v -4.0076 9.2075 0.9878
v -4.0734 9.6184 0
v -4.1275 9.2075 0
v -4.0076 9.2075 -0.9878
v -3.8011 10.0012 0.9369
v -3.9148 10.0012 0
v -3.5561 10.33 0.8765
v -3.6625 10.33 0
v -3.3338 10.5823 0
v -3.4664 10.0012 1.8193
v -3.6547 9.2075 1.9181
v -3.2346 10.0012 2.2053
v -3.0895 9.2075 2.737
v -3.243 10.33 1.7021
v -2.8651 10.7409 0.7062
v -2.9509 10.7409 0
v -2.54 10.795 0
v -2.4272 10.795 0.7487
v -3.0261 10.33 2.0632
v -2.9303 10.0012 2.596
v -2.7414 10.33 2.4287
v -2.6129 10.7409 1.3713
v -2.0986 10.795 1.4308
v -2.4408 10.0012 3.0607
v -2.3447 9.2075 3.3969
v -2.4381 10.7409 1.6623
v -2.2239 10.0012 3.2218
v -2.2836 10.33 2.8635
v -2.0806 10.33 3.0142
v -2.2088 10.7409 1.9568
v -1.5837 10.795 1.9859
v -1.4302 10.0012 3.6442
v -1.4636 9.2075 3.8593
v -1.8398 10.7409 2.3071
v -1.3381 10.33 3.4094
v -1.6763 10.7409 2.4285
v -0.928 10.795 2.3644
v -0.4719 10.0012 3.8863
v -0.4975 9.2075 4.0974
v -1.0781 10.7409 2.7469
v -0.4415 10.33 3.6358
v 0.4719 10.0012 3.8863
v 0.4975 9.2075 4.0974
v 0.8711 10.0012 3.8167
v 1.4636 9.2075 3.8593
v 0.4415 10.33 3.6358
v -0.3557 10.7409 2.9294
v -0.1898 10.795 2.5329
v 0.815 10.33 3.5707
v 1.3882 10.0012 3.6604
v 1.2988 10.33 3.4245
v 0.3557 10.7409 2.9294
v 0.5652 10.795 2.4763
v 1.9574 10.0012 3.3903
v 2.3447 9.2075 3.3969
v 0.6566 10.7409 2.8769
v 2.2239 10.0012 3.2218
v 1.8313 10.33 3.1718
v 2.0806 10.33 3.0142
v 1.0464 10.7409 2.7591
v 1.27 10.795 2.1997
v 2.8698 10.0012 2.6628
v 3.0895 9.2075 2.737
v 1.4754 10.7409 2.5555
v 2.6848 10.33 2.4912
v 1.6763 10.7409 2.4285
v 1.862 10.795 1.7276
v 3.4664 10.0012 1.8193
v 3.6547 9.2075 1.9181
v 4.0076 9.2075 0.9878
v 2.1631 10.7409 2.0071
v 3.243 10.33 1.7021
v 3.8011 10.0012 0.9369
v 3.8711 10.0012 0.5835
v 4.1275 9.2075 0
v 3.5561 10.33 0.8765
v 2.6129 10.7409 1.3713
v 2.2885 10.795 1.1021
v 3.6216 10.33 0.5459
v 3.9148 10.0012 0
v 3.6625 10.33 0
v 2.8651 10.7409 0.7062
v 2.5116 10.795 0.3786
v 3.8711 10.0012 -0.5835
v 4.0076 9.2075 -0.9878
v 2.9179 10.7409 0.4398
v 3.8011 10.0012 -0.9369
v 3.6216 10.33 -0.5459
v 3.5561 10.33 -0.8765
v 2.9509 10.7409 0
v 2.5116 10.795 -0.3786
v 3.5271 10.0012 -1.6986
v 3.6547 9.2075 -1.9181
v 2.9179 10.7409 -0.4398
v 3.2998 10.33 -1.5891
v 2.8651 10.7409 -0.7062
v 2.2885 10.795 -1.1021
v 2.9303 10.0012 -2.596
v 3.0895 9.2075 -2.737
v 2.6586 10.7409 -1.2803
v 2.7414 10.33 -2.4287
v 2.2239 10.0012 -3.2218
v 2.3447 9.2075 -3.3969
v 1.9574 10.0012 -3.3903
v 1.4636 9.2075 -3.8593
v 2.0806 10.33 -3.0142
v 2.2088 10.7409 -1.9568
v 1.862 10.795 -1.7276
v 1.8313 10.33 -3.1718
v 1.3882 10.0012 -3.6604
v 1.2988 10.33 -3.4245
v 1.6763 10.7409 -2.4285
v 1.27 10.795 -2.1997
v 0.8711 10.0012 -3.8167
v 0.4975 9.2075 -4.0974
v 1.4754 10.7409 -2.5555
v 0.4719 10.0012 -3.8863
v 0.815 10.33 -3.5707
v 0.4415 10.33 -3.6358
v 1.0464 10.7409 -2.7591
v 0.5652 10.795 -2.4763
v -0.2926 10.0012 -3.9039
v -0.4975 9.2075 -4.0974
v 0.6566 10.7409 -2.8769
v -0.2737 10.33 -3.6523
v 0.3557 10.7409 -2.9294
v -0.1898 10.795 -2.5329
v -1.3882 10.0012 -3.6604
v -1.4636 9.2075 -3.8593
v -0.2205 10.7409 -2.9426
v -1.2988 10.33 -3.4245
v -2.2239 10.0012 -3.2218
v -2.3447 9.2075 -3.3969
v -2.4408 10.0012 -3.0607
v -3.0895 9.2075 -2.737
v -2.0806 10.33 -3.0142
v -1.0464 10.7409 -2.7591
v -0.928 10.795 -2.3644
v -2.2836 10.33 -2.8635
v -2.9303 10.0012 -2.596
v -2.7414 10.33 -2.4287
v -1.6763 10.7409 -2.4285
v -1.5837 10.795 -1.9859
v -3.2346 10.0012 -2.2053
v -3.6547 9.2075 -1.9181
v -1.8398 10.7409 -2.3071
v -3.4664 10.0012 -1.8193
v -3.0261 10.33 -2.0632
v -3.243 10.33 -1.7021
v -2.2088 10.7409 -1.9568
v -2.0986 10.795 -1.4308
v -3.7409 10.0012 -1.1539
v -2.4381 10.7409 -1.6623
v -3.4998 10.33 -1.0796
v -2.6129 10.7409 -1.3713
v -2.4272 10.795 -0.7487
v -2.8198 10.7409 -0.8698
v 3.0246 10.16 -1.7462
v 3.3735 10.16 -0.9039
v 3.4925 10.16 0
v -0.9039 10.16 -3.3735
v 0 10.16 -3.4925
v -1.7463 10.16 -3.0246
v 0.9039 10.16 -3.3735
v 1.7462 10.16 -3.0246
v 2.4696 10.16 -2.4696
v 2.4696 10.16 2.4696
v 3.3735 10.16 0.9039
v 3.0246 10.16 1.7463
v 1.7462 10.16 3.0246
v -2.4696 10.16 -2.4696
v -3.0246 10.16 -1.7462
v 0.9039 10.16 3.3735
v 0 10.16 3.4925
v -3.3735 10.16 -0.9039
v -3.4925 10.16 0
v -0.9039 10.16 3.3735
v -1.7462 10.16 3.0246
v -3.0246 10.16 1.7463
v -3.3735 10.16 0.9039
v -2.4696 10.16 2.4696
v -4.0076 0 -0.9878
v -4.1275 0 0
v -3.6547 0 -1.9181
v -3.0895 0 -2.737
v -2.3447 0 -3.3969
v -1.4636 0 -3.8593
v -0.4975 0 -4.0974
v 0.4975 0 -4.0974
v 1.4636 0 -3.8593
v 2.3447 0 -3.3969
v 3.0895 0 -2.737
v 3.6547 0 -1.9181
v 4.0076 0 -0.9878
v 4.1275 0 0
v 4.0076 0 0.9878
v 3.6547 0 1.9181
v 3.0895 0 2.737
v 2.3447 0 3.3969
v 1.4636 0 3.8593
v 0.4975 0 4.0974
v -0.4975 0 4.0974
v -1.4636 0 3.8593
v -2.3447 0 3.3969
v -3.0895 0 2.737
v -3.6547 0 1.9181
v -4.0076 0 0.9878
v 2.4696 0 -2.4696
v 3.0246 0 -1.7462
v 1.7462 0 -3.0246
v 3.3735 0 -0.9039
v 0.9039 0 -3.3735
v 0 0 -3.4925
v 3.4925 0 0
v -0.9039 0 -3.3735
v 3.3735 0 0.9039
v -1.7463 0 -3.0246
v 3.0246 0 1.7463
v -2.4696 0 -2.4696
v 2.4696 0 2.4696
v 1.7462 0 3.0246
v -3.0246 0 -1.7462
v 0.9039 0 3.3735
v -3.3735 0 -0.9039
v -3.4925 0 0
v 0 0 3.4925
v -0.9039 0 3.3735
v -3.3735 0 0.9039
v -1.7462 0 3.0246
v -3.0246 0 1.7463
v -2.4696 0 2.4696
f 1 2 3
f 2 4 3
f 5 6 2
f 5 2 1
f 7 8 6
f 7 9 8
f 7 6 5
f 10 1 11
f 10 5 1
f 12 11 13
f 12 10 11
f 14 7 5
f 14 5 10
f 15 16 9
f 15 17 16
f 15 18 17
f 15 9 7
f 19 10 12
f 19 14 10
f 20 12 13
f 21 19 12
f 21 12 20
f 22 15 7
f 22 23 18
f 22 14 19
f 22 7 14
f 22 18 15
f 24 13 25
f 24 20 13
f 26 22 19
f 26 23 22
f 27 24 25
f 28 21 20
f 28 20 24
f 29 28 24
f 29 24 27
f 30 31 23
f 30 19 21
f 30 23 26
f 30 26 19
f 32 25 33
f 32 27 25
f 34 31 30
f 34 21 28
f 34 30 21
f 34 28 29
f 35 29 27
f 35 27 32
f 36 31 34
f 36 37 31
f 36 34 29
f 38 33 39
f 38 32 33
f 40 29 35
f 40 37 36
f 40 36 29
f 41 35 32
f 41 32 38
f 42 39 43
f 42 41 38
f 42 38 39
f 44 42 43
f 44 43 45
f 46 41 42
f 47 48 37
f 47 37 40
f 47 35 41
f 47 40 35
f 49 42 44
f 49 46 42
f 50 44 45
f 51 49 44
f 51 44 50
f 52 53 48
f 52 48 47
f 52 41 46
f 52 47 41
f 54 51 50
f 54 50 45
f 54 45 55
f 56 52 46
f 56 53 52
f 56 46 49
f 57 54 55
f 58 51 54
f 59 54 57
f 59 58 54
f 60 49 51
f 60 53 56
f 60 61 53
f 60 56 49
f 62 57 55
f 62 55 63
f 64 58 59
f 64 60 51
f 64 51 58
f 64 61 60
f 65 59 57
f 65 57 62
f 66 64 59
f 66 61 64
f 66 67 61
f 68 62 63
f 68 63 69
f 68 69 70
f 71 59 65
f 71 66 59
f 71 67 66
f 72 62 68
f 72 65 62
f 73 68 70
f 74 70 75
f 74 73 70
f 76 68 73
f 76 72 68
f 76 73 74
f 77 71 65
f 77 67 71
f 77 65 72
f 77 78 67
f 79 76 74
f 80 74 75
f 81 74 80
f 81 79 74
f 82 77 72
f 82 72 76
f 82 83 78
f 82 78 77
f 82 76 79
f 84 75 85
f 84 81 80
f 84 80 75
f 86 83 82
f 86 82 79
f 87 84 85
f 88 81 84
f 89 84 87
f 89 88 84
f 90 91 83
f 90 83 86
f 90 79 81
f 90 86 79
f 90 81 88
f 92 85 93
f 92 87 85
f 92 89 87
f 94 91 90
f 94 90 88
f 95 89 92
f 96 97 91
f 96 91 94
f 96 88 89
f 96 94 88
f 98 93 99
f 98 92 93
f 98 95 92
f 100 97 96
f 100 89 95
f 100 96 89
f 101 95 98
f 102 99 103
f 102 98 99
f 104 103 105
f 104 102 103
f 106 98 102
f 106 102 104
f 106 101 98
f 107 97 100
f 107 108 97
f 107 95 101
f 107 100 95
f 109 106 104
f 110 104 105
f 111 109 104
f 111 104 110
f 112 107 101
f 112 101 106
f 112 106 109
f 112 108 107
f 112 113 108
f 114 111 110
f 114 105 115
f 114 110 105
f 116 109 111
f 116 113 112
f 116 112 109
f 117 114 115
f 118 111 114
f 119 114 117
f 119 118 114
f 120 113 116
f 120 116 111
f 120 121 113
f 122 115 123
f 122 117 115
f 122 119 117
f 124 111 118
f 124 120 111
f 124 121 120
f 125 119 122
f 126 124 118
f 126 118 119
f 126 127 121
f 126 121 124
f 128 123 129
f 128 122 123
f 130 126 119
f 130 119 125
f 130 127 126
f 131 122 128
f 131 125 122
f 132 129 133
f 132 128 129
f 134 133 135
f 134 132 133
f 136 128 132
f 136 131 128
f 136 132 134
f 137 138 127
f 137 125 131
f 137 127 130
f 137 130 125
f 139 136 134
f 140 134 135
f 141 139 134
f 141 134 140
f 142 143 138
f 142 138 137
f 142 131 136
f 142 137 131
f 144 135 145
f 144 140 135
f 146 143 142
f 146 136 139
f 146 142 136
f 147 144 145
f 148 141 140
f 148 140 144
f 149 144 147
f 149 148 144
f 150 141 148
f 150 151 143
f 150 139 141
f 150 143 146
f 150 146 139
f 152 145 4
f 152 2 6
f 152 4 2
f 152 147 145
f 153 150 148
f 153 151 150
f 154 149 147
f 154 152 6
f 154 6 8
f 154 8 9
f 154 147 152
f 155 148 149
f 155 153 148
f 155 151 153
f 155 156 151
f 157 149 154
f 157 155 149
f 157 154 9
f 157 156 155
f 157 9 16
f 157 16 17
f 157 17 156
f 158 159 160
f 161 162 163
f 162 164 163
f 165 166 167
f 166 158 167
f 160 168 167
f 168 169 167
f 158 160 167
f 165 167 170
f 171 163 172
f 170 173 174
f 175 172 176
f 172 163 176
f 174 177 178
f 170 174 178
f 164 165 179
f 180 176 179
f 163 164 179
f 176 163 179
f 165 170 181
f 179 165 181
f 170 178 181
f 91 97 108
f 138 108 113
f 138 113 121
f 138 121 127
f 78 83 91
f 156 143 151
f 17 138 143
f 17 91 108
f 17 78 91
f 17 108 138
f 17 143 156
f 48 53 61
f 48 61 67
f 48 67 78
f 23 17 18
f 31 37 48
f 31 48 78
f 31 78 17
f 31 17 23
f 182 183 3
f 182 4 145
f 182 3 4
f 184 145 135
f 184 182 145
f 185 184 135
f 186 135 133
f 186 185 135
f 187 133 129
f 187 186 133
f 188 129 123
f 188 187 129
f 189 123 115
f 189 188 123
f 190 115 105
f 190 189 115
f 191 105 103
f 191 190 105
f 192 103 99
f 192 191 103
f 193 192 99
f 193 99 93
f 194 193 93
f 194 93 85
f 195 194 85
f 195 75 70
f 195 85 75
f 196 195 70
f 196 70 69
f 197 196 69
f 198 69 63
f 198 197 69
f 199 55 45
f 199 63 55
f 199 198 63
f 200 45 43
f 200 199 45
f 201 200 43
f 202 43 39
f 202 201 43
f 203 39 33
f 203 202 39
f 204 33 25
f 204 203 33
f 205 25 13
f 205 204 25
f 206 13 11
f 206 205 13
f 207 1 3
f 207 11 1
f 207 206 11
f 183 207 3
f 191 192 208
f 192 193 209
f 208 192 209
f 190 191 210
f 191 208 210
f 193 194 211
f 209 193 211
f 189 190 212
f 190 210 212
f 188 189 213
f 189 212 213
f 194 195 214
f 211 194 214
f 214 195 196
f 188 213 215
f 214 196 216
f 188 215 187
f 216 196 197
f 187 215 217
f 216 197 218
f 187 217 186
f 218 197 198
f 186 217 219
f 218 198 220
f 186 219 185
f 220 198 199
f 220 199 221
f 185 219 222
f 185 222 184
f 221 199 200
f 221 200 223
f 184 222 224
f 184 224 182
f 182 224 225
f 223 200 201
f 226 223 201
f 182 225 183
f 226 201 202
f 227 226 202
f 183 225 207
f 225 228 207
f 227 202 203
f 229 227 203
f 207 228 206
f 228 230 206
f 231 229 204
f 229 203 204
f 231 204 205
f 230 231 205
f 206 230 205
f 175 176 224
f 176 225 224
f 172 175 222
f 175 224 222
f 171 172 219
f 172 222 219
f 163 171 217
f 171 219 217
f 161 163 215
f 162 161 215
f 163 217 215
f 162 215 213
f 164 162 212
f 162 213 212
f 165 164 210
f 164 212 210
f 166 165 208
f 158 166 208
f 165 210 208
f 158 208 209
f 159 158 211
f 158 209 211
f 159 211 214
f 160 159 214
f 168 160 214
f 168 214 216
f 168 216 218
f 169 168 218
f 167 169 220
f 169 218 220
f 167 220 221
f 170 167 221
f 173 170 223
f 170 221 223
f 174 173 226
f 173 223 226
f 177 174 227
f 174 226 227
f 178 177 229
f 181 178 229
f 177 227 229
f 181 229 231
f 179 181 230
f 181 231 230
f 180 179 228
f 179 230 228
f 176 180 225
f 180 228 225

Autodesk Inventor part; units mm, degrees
ref_plane "YZ Plane" through (0, 0, 0) normal (1, 0, 0) x (0, 1, 0)
ref_plane "XZ Plane" through (0, 0, 0) normal (0, 1, 0) x (-1, 0, 0)
ref_plane "XY Plane" through (0, 0, 0) normal (0, 0, 1) x (1, 0, 0)
sketch "Sketch1" plane through (0, 0, 0) normal (0, 1, 0) x (-1, 0, 0)
  circle A0 centre (0, 0) radius 4.1275
  dimension "d0" = 8.255
extrude "Extrusion1" add sketch "Sketch1" along normal blind 10.795
shell "Shell1" thickness 0.635 removed faces 1 at (0.4879, 0, 1.9449)
fillet "Fillet1" radius 1.5875 1 edges at (4.1275, 10.795, 0)
properties part number "buttom piston" material "PBT Plastic"
